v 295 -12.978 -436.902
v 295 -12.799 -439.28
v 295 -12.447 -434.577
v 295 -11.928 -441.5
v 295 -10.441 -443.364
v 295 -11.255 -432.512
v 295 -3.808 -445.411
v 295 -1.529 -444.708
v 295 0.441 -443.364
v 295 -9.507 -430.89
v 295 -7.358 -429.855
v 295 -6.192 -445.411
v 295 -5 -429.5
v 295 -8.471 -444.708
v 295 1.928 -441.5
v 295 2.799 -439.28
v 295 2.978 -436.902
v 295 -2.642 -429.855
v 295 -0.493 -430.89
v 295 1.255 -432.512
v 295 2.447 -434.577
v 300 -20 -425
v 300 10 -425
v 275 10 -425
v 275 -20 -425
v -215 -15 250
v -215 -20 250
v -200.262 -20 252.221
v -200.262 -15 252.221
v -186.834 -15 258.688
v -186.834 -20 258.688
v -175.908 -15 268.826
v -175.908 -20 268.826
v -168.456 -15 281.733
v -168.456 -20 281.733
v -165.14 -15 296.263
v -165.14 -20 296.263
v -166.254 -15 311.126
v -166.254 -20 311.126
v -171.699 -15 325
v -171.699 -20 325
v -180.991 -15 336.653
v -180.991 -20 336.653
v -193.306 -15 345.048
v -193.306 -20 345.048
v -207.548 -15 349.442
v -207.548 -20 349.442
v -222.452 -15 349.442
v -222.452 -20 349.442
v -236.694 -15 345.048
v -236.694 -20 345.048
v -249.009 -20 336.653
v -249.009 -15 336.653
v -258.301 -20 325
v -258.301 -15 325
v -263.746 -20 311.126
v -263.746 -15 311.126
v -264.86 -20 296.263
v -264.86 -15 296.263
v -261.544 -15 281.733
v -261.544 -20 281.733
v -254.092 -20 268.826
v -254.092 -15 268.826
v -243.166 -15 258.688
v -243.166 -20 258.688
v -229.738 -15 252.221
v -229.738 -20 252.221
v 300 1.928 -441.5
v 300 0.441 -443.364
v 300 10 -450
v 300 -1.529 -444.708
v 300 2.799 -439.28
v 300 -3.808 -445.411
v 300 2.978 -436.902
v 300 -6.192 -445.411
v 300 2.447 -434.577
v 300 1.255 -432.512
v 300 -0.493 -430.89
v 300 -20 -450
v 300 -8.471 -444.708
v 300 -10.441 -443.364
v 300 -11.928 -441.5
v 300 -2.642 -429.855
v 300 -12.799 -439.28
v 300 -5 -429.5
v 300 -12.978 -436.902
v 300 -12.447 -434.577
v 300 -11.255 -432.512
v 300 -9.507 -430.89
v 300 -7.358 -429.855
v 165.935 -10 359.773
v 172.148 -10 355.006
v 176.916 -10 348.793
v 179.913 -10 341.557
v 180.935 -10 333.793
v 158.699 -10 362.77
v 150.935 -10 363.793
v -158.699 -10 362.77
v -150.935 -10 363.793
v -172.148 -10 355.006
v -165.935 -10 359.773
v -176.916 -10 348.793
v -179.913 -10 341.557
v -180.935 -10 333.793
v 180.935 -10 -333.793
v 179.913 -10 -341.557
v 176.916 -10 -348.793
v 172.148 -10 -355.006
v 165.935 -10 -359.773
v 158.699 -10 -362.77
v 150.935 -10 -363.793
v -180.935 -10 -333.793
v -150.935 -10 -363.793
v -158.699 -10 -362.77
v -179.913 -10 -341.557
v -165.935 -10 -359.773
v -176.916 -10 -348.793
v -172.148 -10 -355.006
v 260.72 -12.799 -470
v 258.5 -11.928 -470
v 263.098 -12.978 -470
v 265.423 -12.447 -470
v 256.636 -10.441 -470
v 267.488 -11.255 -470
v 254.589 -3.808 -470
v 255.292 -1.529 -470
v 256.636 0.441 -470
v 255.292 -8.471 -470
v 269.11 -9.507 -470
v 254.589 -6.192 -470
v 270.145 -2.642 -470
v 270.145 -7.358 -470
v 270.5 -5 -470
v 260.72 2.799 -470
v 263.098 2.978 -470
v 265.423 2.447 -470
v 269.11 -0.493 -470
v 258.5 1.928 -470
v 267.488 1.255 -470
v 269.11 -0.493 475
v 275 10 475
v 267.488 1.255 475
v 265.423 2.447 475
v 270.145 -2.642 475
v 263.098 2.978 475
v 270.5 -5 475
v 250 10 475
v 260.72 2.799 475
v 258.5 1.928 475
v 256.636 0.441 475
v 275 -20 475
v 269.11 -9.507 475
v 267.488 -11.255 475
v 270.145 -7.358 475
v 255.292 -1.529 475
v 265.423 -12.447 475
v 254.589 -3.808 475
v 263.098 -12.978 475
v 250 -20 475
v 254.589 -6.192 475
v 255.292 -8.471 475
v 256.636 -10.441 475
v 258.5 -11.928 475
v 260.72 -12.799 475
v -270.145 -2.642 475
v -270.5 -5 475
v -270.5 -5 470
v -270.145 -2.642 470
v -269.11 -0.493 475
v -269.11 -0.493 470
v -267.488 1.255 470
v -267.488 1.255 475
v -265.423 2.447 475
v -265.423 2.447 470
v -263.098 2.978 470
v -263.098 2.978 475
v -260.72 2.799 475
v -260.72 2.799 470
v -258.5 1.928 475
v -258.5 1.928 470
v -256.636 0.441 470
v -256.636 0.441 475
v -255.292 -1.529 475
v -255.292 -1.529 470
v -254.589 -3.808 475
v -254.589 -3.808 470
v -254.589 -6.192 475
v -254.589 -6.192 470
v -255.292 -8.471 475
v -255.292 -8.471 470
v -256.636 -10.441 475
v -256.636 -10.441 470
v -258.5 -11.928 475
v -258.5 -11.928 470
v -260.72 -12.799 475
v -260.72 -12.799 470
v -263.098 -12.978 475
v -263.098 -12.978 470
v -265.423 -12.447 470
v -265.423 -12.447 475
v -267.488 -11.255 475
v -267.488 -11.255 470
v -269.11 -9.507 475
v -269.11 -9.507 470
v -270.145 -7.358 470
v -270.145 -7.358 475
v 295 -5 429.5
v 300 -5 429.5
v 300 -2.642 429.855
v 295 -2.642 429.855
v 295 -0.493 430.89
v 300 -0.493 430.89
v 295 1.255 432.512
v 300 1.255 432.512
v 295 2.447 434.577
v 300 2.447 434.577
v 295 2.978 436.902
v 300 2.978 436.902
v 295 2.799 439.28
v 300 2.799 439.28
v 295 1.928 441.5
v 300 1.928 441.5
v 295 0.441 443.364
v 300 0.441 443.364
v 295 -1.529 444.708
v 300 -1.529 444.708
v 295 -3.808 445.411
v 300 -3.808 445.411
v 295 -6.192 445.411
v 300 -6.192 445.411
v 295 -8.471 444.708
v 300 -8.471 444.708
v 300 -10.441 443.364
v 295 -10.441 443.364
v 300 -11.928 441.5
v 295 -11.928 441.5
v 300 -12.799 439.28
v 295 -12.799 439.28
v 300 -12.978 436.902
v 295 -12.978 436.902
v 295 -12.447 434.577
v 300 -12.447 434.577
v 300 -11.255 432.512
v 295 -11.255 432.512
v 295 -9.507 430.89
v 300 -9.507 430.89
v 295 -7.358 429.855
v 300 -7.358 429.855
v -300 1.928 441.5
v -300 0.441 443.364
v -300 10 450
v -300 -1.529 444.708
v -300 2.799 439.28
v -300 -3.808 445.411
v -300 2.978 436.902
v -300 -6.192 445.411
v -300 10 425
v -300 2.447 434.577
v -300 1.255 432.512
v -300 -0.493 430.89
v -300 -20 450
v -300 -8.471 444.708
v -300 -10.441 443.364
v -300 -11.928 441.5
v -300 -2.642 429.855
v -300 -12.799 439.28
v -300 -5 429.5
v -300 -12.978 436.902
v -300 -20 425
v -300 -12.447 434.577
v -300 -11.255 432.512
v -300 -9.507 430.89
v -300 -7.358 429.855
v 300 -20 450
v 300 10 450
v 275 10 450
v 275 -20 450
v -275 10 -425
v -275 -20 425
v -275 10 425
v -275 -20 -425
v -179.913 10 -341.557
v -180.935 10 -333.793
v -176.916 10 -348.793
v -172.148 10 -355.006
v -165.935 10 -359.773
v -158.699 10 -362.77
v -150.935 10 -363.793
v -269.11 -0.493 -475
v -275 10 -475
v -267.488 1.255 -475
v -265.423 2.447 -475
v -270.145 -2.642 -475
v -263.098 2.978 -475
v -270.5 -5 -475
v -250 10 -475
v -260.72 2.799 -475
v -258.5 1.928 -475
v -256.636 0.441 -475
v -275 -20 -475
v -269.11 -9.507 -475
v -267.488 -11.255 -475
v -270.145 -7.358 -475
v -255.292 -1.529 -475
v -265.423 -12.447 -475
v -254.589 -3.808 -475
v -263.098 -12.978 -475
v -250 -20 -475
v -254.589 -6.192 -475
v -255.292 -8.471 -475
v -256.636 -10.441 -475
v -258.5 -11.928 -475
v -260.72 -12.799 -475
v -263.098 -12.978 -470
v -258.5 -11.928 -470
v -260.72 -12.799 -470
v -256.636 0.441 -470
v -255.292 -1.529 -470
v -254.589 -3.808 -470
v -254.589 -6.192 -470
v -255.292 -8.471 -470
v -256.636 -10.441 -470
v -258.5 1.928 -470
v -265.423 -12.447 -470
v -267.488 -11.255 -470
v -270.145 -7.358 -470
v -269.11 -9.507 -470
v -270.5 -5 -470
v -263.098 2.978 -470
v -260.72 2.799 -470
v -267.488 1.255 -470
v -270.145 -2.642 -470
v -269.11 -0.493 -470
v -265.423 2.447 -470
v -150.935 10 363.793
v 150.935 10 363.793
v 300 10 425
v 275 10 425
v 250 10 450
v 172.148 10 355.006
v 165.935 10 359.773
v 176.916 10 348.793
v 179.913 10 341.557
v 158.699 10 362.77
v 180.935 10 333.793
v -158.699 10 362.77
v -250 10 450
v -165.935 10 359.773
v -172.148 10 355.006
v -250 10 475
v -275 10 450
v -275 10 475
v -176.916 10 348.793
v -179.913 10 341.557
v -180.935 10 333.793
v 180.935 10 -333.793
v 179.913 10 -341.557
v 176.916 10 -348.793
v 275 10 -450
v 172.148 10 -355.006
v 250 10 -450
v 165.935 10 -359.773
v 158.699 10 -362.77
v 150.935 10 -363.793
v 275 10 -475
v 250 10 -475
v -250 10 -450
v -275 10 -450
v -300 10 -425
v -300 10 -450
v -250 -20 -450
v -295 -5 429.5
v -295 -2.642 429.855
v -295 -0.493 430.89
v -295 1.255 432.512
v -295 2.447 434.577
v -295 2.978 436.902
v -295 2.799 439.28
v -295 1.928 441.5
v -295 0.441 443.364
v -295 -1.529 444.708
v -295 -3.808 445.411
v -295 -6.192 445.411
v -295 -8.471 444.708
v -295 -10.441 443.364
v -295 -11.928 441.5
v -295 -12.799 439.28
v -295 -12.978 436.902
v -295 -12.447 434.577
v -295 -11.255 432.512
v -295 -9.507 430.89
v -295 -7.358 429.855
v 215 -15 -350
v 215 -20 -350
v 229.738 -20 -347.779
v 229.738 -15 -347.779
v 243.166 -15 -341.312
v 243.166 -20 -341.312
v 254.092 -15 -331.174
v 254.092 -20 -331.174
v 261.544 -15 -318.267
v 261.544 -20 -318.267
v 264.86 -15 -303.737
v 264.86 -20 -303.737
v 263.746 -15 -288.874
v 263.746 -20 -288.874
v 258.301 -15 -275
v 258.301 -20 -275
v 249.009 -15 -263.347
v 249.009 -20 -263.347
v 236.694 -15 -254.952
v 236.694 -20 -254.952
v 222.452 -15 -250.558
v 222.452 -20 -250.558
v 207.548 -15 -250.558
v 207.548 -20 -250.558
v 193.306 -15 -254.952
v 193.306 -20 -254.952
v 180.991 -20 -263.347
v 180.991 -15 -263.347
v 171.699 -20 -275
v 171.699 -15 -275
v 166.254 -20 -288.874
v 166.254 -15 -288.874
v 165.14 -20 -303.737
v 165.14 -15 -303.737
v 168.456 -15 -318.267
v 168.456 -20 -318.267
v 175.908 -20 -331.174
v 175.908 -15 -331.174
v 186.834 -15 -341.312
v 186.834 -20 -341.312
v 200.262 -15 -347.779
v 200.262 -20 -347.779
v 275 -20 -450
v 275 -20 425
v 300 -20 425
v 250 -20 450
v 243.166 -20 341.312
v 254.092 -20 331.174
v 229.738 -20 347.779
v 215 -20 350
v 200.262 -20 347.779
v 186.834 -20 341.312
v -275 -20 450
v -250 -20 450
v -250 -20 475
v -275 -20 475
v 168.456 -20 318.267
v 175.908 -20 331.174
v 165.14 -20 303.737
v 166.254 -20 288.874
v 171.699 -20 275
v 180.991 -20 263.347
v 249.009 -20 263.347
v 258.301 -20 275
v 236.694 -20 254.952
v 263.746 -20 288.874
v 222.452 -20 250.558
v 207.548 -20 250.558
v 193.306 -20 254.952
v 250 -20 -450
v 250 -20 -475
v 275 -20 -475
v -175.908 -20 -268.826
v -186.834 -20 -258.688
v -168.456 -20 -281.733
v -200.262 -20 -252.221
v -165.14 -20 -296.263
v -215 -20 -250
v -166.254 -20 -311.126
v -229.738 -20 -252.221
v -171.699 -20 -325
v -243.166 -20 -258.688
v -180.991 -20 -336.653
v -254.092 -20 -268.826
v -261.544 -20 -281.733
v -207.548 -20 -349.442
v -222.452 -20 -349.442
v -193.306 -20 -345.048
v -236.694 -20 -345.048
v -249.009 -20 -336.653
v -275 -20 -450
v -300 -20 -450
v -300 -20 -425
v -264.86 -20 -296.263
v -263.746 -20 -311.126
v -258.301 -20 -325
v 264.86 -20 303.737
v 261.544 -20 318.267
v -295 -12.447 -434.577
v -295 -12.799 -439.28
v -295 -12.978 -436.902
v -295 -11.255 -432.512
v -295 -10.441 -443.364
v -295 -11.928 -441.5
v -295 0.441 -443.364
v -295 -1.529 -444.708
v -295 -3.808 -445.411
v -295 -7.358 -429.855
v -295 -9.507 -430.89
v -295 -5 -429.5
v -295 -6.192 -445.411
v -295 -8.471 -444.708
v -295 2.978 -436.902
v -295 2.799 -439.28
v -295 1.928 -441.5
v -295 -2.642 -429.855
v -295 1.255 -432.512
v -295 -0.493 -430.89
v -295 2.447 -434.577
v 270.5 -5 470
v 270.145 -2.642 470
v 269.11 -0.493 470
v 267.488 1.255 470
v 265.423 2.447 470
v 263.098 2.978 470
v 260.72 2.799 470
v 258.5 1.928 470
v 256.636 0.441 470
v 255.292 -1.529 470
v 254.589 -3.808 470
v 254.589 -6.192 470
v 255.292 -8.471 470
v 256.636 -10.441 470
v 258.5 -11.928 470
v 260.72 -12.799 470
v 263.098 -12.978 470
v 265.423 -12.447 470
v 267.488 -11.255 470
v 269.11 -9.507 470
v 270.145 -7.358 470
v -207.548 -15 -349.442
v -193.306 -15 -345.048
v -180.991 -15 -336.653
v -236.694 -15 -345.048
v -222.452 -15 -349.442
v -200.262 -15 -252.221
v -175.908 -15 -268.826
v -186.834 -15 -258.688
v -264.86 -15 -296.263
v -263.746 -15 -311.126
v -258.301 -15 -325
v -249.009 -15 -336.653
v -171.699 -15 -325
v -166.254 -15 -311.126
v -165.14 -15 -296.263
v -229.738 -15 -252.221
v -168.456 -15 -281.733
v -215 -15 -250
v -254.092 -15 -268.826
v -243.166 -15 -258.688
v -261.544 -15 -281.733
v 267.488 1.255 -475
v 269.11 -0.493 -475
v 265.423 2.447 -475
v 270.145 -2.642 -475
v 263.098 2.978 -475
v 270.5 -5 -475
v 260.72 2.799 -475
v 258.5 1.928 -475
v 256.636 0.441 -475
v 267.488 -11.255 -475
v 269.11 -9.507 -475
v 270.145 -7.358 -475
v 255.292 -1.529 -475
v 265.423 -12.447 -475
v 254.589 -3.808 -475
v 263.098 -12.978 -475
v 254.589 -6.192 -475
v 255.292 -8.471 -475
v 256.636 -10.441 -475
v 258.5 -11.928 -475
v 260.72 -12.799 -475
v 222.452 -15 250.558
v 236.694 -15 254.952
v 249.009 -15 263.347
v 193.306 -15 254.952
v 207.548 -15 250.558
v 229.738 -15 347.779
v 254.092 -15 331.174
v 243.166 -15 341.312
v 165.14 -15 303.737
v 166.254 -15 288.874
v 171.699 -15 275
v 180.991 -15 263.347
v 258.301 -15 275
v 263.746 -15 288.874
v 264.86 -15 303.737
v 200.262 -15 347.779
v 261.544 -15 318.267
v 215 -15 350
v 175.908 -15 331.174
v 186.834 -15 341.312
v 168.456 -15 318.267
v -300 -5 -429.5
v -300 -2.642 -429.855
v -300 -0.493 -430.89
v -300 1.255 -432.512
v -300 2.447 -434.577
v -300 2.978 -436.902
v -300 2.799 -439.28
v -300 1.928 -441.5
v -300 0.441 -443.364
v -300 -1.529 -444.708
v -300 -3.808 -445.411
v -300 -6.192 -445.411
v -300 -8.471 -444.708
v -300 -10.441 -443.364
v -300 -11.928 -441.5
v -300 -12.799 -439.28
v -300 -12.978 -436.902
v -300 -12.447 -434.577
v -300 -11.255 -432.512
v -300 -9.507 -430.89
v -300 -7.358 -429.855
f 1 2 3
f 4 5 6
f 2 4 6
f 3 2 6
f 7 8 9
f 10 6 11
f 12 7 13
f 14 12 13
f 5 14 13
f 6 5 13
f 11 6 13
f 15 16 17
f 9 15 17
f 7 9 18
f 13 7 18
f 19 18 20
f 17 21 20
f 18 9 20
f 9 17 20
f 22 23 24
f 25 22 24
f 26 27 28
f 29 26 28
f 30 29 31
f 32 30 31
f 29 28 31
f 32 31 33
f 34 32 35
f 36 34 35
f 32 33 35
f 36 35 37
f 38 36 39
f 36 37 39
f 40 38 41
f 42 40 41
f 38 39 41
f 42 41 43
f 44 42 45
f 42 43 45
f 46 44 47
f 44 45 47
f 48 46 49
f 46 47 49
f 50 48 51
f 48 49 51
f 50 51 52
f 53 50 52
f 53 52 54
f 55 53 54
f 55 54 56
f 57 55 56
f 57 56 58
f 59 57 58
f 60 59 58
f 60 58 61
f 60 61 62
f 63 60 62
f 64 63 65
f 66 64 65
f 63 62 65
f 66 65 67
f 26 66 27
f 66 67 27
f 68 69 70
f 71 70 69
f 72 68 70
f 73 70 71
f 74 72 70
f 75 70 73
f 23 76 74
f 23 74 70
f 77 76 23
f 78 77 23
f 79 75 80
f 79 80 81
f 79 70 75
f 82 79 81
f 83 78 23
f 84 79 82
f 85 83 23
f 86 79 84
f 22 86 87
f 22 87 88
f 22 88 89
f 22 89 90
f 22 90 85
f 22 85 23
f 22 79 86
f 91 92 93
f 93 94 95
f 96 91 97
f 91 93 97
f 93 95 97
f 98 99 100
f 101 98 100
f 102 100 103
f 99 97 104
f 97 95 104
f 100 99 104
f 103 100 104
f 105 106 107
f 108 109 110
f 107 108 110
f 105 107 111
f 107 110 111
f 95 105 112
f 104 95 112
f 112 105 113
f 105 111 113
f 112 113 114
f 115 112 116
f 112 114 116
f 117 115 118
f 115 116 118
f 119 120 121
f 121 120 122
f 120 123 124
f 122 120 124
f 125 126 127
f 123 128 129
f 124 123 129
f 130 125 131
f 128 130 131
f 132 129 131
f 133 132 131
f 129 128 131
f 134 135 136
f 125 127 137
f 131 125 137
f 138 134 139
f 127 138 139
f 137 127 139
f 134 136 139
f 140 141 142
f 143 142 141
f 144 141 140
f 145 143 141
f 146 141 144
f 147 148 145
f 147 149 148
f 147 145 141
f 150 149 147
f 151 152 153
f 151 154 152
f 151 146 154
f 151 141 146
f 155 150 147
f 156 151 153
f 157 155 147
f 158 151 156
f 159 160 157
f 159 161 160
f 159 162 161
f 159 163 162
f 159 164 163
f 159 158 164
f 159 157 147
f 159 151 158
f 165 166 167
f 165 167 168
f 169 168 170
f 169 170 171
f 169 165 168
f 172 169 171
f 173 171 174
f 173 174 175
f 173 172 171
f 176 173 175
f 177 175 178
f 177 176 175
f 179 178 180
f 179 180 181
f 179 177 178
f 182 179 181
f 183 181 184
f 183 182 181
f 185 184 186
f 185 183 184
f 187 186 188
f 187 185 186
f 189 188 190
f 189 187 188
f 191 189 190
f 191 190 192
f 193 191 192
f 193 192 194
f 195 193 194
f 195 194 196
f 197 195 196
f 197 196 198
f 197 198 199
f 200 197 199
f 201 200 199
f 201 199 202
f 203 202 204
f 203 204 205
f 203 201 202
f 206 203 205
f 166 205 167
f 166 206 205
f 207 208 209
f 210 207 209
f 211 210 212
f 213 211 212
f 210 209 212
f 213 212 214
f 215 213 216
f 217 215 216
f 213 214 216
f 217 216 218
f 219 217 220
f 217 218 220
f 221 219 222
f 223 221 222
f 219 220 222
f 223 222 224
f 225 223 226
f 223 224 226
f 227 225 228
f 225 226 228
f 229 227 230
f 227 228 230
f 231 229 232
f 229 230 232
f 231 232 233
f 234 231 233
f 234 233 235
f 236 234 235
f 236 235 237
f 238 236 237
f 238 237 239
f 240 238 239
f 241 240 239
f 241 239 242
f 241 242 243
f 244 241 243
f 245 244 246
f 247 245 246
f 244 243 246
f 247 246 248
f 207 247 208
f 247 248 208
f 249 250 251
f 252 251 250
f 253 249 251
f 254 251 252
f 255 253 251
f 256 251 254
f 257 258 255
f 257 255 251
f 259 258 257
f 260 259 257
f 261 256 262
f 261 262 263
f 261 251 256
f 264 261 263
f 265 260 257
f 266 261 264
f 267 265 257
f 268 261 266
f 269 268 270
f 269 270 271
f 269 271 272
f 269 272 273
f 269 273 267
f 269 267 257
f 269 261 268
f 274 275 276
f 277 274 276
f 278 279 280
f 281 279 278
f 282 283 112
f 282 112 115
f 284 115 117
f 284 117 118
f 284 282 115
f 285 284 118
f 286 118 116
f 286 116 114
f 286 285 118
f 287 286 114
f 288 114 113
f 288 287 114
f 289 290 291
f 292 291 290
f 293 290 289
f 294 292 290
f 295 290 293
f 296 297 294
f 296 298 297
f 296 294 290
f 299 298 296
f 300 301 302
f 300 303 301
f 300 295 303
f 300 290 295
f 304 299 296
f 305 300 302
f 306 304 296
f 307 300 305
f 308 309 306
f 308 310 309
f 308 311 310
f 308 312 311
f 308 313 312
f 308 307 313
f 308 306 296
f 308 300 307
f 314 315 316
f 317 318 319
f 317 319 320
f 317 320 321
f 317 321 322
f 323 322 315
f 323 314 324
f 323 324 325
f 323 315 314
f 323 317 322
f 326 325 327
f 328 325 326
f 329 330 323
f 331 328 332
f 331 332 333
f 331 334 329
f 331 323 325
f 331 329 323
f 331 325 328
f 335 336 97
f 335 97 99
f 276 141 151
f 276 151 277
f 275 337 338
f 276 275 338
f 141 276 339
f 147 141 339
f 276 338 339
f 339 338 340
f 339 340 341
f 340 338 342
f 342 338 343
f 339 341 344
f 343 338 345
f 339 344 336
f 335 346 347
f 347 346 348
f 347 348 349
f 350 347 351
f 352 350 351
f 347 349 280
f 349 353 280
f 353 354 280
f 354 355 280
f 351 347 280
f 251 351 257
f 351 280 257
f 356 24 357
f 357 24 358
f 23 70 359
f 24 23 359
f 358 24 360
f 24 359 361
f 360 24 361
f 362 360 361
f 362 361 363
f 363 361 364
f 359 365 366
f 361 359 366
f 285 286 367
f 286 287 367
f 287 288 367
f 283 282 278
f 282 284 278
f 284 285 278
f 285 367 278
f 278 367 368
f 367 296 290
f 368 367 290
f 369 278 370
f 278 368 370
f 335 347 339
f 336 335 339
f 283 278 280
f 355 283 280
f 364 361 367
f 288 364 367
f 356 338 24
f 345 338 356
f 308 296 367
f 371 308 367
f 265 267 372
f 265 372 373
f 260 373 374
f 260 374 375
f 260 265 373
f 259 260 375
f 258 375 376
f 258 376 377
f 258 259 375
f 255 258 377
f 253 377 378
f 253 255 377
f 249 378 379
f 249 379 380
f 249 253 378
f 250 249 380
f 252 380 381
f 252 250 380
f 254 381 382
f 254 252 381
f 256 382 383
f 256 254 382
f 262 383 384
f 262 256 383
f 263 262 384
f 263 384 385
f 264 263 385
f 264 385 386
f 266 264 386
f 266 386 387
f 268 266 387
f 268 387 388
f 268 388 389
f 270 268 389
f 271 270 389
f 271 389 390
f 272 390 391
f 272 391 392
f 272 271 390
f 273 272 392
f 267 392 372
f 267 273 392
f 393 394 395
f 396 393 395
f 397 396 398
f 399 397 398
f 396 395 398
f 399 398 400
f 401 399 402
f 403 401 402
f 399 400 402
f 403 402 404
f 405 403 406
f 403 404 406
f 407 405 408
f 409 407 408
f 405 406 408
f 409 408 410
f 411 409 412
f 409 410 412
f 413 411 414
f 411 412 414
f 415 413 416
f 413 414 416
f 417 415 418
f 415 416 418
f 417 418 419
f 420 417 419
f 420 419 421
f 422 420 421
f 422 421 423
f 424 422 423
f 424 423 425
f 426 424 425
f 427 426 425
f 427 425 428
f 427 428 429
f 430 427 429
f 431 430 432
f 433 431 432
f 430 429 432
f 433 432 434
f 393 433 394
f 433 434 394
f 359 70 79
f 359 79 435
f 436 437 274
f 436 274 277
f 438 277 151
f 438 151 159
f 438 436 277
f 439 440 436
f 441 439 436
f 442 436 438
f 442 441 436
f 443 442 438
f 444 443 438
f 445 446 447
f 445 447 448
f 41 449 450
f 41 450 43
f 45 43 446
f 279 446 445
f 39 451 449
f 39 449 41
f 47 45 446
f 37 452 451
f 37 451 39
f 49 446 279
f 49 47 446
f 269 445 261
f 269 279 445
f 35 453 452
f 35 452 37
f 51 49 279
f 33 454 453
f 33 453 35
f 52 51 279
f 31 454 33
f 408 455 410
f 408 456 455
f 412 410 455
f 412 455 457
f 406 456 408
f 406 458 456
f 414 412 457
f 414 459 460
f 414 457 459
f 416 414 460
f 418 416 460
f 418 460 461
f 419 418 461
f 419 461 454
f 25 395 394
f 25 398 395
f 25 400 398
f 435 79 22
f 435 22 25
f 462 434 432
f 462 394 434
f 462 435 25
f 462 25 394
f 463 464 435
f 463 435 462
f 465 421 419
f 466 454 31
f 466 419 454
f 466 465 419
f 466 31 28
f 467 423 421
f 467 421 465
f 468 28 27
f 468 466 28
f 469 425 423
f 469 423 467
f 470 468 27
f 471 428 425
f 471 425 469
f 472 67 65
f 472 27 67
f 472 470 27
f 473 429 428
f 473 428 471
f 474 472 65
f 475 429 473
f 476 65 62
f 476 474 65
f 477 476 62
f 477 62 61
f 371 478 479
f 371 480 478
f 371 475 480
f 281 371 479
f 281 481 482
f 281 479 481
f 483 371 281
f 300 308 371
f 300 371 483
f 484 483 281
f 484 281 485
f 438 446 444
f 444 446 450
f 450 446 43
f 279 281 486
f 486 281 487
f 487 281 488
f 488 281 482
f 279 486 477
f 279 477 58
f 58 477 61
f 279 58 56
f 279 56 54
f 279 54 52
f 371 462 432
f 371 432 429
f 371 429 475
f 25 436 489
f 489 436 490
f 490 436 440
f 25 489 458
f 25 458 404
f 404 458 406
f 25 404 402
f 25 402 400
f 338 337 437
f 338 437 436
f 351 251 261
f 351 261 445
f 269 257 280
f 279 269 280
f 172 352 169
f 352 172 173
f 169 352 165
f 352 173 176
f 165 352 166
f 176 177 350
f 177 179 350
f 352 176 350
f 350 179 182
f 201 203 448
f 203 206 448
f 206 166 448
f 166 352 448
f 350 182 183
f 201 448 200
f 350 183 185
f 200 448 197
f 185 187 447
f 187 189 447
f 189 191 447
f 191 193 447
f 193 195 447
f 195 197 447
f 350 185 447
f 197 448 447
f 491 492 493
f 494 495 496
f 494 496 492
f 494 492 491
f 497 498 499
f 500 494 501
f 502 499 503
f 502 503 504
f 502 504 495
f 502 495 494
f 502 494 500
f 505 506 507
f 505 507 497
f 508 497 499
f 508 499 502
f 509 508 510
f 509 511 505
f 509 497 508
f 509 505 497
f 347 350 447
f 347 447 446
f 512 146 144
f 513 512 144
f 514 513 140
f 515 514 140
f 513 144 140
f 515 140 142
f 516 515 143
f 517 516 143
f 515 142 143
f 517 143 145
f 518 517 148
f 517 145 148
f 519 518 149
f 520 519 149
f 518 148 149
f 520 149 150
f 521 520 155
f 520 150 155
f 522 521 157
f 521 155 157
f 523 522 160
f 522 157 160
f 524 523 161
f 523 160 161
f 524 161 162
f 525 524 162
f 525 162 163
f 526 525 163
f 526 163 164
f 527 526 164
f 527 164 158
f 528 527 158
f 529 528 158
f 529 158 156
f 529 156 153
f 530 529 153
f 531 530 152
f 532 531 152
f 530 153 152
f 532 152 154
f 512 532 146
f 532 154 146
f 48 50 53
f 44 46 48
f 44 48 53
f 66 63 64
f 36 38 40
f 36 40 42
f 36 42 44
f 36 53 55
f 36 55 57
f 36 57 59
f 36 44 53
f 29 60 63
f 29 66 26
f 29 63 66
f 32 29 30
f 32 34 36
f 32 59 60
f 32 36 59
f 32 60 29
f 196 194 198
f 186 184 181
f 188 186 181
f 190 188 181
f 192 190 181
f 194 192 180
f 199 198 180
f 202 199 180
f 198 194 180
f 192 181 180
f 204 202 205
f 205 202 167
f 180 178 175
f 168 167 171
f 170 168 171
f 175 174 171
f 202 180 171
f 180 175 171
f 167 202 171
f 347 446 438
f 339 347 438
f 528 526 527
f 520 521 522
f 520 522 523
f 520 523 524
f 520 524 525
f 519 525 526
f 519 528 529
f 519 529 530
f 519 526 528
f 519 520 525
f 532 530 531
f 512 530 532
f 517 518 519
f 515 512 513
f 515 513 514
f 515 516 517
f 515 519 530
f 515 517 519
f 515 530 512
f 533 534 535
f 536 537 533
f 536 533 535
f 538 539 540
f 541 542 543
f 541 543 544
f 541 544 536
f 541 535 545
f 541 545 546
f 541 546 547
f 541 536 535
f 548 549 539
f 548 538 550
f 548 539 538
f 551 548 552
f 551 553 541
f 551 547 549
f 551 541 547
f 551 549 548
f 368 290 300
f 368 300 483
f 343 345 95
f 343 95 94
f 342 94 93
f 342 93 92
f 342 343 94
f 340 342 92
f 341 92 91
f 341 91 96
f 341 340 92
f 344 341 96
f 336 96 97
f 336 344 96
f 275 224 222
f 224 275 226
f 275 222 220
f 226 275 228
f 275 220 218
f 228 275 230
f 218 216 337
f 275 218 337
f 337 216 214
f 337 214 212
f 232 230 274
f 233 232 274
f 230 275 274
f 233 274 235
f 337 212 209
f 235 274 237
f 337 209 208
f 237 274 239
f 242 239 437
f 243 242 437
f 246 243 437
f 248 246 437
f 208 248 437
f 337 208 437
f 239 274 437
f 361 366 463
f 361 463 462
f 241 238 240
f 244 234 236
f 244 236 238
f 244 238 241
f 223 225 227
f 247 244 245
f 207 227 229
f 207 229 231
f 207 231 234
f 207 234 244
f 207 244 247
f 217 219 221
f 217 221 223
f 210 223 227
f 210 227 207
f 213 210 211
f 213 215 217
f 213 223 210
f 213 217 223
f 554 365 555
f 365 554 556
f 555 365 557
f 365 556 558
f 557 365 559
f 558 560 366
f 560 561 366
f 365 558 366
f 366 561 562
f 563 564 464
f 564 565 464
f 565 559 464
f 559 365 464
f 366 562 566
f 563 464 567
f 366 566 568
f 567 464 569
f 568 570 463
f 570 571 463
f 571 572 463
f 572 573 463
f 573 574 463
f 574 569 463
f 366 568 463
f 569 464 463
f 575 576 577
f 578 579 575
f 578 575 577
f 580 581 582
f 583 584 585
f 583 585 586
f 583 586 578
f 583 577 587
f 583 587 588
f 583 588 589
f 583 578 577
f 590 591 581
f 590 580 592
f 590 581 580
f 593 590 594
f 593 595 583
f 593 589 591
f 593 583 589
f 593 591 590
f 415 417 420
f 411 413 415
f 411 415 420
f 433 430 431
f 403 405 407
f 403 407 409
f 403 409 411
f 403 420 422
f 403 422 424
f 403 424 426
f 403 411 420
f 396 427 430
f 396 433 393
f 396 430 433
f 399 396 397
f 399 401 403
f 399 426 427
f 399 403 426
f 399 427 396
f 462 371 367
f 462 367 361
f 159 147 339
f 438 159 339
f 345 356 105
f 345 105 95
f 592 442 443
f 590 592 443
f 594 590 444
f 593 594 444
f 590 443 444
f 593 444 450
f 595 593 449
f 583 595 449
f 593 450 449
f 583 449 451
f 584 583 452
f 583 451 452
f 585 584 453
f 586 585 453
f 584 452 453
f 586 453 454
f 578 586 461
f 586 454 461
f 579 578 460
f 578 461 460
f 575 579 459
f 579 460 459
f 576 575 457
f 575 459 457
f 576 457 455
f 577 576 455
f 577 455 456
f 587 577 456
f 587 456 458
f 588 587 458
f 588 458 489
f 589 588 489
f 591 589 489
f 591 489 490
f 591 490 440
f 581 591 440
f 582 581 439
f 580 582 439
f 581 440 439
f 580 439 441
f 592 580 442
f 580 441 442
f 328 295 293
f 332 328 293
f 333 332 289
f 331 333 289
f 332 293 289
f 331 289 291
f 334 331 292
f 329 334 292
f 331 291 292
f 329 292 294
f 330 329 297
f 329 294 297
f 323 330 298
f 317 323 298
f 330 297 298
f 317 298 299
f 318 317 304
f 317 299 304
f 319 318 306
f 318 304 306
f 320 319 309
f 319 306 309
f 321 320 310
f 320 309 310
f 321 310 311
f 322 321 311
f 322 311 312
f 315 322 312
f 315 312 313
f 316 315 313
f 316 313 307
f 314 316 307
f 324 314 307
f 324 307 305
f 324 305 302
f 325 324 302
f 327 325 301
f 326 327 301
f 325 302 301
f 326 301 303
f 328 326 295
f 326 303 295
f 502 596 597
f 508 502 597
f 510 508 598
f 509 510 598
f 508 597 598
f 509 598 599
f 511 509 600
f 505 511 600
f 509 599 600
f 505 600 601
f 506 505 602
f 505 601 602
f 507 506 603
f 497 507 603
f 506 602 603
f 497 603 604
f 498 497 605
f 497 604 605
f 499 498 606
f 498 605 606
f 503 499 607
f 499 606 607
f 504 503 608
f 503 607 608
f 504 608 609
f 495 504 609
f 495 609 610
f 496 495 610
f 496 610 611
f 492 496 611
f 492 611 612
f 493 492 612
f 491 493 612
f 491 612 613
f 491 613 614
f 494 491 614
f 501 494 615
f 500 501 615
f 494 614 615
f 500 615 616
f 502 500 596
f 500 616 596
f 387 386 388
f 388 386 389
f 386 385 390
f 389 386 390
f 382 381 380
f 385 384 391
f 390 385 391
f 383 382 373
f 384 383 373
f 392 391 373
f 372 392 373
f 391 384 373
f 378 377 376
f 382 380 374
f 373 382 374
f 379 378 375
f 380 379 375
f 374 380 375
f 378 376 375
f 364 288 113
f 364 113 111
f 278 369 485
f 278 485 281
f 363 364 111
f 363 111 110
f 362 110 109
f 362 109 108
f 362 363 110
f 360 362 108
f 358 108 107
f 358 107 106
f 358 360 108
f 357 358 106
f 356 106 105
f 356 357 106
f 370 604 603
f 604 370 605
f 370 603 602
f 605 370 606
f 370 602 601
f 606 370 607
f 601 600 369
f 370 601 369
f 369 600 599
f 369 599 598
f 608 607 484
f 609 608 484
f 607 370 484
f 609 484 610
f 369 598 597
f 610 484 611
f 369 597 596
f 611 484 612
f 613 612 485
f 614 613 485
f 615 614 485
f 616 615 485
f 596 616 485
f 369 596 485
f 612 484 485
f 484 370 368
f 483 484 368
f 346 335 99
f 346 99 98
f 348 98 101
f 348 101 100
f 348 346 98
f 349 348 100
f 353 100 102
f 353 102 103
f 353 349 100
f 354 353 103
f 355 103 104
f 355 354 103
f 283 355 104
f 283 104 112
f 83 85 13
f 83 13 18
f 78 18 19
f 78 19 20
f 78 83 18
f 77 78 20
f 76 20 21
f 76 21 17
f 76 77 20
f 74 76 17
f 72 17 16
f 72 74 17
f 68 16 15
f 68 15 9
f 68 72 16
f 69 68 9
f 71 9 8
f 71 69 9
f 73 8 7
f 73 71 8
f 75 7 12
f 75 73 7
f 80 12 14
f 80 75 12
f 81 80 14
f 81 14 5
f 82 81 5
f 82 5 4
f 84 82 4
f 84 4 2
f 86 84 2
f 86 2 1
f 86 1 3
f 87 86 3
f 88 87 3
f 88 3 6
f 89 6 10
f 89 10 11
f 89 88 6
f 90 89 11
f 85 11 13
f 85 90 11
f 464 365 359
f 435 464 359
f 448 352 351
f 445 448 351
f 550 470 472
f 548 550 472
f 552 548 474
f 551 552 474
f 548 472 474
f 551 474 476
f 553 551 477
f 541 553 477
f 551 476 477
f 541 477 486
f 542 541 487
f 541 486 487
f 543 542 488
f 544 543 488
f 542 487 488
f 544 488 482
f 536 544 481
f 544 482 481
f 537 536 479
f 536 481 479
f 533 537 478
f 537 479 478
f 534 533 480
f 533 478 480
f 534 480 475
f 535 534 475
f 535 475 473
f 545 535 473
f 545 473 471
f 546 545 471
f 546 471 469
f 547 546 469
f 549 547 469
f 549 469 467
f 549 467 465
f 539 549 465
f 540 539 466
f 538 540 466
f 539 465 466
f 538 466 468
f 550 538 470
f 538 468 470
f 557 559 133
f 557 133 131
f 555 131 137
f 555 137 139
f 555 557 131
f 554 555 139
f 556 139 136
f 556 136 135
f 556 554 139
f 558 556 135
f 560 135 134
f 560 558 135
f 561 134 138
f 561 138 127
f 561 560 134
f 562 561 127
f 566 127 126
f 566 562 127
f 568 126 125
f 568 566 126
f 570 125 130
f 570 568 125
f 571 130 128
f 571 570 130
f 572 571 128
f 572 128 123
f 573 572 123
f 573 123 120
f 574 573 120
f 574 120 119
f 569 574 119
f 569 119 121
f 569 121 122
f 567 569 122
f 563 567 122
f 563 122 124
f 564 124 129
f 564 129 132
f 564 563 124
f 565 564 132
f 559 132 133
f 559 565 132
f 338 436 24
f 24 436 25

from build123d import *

# Parameters (mm, degrees)
EXTRUDE_1_DEPTH          = 10
EXTRUDE_1_DEPTH_BACK     = 20
SKETCH_1_W               = 550
SKETCH_1_H               = 900
CUT_EXTRUDE_4_DEPTH      = 20
SKETCH_7_R               = 50
CUT_EXTRUDE_5_DEPTH      = 5
SKETCH_8_W               = 25
SKETCH_8_H               = 25
EXTRUDE_2_DEPTH          = 30
SKETCH_9_R               = 8
CUT_EXTRUDE_6_DEPTH      = 5
SKETCH_10_R              = 8
CUT_EXTRUDE_7_DEPTH      = 5
MIRROR_2_COPY_1_SKETCH_W = 25
MIRROR_2_COPY_1_SKETCH_H = 25
MIRROR_2_COPY_1_DEPTH    = 30
MIRROR_2_COPY_2_SKETCH_R = 8
MIRROR_2_COPY_2_DEPTH    = 5
MIRROR_2_COPY_3_SKETCH_R = 8
MIRROR_2_COPY_3_DEPTH    = 5


with BuildPart() as part:
    # 草图1 → 凸台-拉伸1 (new, two sides: drawn at the far end of the back side and taken through both)
    with BuildSketch(Plane(origin=(0, 0, 0), x_dir=(1, 0, 0), z_dir=(0, 1, 0)).offset(-EXTRUDE_1_DEPTH_BACK)):
        Rectangle(SKETCH_1_W, SKETCH_1_H)
    extrude(amount=EXTRUDE_1_DEPTH + EXTRUDE_1_DEPTH_BACK)

    # 草图6 → 切除-拉伸4 (cut)
    with BuildSketch(Plane(origin=(0, 10, 0), x_dir=(1, 0, 0), z_dir=(0, 1, 0))):
        with BuildLine():
            Line((-150.934743828, 363.792707869), (150.934743828, 363.792707869))
            ThreePointArc((150.934743828, 363.792707869), (172.147947264, 355.005911305), (180.934743828, 333.792707869))
            Line((180.934743828, 333.792707869), (180.934743828, -333.792707869))
            ThreePointArc((180.934743828, -333.792707869), (172.147947264, -355.005911305), (150.934743828, -363.792707869))
            Line((150.934743828, -363.792707869), (-150.934743828, -363.792707869))
            ThreePointArc((-150.934743828, -363.792707869), (-172.147947264, -355.005911305), (-180.934743828, -333.792707869))
            Line((-180.934743828, -333.792707869), (-180.934743828, 333.792707869))
            ThreePointArc((-180.934743828, 333.792707869), (-172.147947264, 355.005911305), (-150.934743828, 363.792707869))
        make_face()
    extrude(amount=-CUT_EXTRUDE_4_DEPTH, mode=Mode.SUBTRACT)

    # 草图7 → 切除-拉伸5 (cut)
    with BuildSketch(Plane.XZ.offset(20)):
        with Locations(Location((-215, 300, 0), (0, 0, 270))):
            Circle(SKETCH_7_R)
        with Locations(Location((-215, -300, 0), (0, 0, 90))):
            Circle(SKETCH_7_R)
        with Locations(Location((215, -300, 0), (0, 0, 270))):
            Circle(SKETCH_7_R)
        with Locations(Location((215, 300, 0), (0, 0, 90))):
            Circle(SKETCH_7_R)
    extrude(amount=-CUT_EXTRUDE_5_DEPTH, mode=Mode.SUBTRACT)

    # 草图8 → 凸台-拉伸2 (add)
    with BuildSketch(Plane.XZ.offset(20)):
        with Locations((-262.5, -462.5)):
            Rectangle(SKETCH_8_W, SKETCH_8_H)
        with Locations((-287.5, -437.5)):
            Rectangle(SKETCH_8_W, SKETCH_8_H)
    extrude_2 = extrude(amount=-EXTRUDE_2_DEPTH)

    # 草图9 → 切除-拉伸6 (cut)
    with BuildSketch(Plane.ZY.offset(300)):
        with Locations((-437.5, -5)):
            Circle(SKETCH_9_R)
    cut_extrude_6 = extrude(amount=-CUT_EXTRUDE_6_DEPTH, mode=Mode.SUBTRACT)

    # 草图10 → 切除-拉伸7 (cut)
    with BuildSketch(Plane(origin=(0, 0, -475), x_dir=(-1, 0, 0), z_dir=(0, 0, -1))):
        with Locations((262.5, -5)):
            Circle(SKETCH_10_R)
    cut_extrude_7 = extrude(amount=-CUT_EXTRUDE_7_DEPTH, mode=Mode.SUBTRACT)

    # 镜向1: 凸台-拉伸2, 切除-拉伸6, 切除-拉伸7 across plane
    add(extrude_2.mirror(Plane(origin=(0, 0, 0), x_dir=(0, 0, 1), z_dir=(1, 0, 0))))
    add(cut_extrude_6.mirror(Plane(origin=(0, 0, 0), x_dir=(0, 0, 1), z_dir=(1, 0, 0))), mode=Mode.SUBTRACT)
    add(cut_extrude_7.mirror(Plane(origin=(0, 0, 0), x_dir=(0, 0, 1), z_dir=(1, 0, 0))), mode=Mode.SUBTRACT)

    # 镜向2: 凸台-拉伸2, 切除-拉伸6, 切除-拉伸7 across plane
    add(extrude_2.mirror(Plane.XY))
    add(cut_extrude_6.mirror(Plane.XY), mode=Mode.SUBTRACT)
    add(cut_extrude_7.mirror(Plane.XY), mode=Mode.SUBTRACT)

    # 镜向2 copy 1 sketch → 镜向2 copy 1 (add)
    with BuildSketch(Plane(origin=(0, -20, 0), x_dir=(-1, 0, 0), z_dir=(0, -1, 0))):
        with Locations((-262.5, -462.5)):
            Rectangle(MIRROR_2_COPY_1_SKETCH_W, MIRROR_2_COPY_1_SKETCH_H)
        with Locations((-287.5, -437.5)):
            Rectangle(MIRROR_2_COPY_1_SKETCH_W, MIRROR_2_COPY_1_SKETCH_H)
    extrude(amount=-MIRROR_2_COPY_1_DEPTH)

    # 镜向2 copy 2 sketch → 镜向2 copy 2 (cut)
    with BuildSketch(Plane(origin=(300, 0, 0), x_dir=(0, 0, -1), z_dir=(1, 0, 0))):
        with Locations((-437.5, -5)):
            Circle(MIRROR_2_COPY_2_SKETCH_R)
    extrude(amount=-MIRROR_2_COPY_2_DEPTH, mode=Mode.SUBTRACT)

    # 镜向2 copy 3 sketch → 镜向2 copy 3 (cut)
    with BuildSketch(Plane.XY.offset(475)):
        with Locations((262.5, -5)):
            Circle(MIRROR_2_COPY_3_SKETCH_R)
    extrude(amount=-MIRROR_2_COPY_3_DEPTH, mode=Mode.SUBTRACT)


solid = part.part
